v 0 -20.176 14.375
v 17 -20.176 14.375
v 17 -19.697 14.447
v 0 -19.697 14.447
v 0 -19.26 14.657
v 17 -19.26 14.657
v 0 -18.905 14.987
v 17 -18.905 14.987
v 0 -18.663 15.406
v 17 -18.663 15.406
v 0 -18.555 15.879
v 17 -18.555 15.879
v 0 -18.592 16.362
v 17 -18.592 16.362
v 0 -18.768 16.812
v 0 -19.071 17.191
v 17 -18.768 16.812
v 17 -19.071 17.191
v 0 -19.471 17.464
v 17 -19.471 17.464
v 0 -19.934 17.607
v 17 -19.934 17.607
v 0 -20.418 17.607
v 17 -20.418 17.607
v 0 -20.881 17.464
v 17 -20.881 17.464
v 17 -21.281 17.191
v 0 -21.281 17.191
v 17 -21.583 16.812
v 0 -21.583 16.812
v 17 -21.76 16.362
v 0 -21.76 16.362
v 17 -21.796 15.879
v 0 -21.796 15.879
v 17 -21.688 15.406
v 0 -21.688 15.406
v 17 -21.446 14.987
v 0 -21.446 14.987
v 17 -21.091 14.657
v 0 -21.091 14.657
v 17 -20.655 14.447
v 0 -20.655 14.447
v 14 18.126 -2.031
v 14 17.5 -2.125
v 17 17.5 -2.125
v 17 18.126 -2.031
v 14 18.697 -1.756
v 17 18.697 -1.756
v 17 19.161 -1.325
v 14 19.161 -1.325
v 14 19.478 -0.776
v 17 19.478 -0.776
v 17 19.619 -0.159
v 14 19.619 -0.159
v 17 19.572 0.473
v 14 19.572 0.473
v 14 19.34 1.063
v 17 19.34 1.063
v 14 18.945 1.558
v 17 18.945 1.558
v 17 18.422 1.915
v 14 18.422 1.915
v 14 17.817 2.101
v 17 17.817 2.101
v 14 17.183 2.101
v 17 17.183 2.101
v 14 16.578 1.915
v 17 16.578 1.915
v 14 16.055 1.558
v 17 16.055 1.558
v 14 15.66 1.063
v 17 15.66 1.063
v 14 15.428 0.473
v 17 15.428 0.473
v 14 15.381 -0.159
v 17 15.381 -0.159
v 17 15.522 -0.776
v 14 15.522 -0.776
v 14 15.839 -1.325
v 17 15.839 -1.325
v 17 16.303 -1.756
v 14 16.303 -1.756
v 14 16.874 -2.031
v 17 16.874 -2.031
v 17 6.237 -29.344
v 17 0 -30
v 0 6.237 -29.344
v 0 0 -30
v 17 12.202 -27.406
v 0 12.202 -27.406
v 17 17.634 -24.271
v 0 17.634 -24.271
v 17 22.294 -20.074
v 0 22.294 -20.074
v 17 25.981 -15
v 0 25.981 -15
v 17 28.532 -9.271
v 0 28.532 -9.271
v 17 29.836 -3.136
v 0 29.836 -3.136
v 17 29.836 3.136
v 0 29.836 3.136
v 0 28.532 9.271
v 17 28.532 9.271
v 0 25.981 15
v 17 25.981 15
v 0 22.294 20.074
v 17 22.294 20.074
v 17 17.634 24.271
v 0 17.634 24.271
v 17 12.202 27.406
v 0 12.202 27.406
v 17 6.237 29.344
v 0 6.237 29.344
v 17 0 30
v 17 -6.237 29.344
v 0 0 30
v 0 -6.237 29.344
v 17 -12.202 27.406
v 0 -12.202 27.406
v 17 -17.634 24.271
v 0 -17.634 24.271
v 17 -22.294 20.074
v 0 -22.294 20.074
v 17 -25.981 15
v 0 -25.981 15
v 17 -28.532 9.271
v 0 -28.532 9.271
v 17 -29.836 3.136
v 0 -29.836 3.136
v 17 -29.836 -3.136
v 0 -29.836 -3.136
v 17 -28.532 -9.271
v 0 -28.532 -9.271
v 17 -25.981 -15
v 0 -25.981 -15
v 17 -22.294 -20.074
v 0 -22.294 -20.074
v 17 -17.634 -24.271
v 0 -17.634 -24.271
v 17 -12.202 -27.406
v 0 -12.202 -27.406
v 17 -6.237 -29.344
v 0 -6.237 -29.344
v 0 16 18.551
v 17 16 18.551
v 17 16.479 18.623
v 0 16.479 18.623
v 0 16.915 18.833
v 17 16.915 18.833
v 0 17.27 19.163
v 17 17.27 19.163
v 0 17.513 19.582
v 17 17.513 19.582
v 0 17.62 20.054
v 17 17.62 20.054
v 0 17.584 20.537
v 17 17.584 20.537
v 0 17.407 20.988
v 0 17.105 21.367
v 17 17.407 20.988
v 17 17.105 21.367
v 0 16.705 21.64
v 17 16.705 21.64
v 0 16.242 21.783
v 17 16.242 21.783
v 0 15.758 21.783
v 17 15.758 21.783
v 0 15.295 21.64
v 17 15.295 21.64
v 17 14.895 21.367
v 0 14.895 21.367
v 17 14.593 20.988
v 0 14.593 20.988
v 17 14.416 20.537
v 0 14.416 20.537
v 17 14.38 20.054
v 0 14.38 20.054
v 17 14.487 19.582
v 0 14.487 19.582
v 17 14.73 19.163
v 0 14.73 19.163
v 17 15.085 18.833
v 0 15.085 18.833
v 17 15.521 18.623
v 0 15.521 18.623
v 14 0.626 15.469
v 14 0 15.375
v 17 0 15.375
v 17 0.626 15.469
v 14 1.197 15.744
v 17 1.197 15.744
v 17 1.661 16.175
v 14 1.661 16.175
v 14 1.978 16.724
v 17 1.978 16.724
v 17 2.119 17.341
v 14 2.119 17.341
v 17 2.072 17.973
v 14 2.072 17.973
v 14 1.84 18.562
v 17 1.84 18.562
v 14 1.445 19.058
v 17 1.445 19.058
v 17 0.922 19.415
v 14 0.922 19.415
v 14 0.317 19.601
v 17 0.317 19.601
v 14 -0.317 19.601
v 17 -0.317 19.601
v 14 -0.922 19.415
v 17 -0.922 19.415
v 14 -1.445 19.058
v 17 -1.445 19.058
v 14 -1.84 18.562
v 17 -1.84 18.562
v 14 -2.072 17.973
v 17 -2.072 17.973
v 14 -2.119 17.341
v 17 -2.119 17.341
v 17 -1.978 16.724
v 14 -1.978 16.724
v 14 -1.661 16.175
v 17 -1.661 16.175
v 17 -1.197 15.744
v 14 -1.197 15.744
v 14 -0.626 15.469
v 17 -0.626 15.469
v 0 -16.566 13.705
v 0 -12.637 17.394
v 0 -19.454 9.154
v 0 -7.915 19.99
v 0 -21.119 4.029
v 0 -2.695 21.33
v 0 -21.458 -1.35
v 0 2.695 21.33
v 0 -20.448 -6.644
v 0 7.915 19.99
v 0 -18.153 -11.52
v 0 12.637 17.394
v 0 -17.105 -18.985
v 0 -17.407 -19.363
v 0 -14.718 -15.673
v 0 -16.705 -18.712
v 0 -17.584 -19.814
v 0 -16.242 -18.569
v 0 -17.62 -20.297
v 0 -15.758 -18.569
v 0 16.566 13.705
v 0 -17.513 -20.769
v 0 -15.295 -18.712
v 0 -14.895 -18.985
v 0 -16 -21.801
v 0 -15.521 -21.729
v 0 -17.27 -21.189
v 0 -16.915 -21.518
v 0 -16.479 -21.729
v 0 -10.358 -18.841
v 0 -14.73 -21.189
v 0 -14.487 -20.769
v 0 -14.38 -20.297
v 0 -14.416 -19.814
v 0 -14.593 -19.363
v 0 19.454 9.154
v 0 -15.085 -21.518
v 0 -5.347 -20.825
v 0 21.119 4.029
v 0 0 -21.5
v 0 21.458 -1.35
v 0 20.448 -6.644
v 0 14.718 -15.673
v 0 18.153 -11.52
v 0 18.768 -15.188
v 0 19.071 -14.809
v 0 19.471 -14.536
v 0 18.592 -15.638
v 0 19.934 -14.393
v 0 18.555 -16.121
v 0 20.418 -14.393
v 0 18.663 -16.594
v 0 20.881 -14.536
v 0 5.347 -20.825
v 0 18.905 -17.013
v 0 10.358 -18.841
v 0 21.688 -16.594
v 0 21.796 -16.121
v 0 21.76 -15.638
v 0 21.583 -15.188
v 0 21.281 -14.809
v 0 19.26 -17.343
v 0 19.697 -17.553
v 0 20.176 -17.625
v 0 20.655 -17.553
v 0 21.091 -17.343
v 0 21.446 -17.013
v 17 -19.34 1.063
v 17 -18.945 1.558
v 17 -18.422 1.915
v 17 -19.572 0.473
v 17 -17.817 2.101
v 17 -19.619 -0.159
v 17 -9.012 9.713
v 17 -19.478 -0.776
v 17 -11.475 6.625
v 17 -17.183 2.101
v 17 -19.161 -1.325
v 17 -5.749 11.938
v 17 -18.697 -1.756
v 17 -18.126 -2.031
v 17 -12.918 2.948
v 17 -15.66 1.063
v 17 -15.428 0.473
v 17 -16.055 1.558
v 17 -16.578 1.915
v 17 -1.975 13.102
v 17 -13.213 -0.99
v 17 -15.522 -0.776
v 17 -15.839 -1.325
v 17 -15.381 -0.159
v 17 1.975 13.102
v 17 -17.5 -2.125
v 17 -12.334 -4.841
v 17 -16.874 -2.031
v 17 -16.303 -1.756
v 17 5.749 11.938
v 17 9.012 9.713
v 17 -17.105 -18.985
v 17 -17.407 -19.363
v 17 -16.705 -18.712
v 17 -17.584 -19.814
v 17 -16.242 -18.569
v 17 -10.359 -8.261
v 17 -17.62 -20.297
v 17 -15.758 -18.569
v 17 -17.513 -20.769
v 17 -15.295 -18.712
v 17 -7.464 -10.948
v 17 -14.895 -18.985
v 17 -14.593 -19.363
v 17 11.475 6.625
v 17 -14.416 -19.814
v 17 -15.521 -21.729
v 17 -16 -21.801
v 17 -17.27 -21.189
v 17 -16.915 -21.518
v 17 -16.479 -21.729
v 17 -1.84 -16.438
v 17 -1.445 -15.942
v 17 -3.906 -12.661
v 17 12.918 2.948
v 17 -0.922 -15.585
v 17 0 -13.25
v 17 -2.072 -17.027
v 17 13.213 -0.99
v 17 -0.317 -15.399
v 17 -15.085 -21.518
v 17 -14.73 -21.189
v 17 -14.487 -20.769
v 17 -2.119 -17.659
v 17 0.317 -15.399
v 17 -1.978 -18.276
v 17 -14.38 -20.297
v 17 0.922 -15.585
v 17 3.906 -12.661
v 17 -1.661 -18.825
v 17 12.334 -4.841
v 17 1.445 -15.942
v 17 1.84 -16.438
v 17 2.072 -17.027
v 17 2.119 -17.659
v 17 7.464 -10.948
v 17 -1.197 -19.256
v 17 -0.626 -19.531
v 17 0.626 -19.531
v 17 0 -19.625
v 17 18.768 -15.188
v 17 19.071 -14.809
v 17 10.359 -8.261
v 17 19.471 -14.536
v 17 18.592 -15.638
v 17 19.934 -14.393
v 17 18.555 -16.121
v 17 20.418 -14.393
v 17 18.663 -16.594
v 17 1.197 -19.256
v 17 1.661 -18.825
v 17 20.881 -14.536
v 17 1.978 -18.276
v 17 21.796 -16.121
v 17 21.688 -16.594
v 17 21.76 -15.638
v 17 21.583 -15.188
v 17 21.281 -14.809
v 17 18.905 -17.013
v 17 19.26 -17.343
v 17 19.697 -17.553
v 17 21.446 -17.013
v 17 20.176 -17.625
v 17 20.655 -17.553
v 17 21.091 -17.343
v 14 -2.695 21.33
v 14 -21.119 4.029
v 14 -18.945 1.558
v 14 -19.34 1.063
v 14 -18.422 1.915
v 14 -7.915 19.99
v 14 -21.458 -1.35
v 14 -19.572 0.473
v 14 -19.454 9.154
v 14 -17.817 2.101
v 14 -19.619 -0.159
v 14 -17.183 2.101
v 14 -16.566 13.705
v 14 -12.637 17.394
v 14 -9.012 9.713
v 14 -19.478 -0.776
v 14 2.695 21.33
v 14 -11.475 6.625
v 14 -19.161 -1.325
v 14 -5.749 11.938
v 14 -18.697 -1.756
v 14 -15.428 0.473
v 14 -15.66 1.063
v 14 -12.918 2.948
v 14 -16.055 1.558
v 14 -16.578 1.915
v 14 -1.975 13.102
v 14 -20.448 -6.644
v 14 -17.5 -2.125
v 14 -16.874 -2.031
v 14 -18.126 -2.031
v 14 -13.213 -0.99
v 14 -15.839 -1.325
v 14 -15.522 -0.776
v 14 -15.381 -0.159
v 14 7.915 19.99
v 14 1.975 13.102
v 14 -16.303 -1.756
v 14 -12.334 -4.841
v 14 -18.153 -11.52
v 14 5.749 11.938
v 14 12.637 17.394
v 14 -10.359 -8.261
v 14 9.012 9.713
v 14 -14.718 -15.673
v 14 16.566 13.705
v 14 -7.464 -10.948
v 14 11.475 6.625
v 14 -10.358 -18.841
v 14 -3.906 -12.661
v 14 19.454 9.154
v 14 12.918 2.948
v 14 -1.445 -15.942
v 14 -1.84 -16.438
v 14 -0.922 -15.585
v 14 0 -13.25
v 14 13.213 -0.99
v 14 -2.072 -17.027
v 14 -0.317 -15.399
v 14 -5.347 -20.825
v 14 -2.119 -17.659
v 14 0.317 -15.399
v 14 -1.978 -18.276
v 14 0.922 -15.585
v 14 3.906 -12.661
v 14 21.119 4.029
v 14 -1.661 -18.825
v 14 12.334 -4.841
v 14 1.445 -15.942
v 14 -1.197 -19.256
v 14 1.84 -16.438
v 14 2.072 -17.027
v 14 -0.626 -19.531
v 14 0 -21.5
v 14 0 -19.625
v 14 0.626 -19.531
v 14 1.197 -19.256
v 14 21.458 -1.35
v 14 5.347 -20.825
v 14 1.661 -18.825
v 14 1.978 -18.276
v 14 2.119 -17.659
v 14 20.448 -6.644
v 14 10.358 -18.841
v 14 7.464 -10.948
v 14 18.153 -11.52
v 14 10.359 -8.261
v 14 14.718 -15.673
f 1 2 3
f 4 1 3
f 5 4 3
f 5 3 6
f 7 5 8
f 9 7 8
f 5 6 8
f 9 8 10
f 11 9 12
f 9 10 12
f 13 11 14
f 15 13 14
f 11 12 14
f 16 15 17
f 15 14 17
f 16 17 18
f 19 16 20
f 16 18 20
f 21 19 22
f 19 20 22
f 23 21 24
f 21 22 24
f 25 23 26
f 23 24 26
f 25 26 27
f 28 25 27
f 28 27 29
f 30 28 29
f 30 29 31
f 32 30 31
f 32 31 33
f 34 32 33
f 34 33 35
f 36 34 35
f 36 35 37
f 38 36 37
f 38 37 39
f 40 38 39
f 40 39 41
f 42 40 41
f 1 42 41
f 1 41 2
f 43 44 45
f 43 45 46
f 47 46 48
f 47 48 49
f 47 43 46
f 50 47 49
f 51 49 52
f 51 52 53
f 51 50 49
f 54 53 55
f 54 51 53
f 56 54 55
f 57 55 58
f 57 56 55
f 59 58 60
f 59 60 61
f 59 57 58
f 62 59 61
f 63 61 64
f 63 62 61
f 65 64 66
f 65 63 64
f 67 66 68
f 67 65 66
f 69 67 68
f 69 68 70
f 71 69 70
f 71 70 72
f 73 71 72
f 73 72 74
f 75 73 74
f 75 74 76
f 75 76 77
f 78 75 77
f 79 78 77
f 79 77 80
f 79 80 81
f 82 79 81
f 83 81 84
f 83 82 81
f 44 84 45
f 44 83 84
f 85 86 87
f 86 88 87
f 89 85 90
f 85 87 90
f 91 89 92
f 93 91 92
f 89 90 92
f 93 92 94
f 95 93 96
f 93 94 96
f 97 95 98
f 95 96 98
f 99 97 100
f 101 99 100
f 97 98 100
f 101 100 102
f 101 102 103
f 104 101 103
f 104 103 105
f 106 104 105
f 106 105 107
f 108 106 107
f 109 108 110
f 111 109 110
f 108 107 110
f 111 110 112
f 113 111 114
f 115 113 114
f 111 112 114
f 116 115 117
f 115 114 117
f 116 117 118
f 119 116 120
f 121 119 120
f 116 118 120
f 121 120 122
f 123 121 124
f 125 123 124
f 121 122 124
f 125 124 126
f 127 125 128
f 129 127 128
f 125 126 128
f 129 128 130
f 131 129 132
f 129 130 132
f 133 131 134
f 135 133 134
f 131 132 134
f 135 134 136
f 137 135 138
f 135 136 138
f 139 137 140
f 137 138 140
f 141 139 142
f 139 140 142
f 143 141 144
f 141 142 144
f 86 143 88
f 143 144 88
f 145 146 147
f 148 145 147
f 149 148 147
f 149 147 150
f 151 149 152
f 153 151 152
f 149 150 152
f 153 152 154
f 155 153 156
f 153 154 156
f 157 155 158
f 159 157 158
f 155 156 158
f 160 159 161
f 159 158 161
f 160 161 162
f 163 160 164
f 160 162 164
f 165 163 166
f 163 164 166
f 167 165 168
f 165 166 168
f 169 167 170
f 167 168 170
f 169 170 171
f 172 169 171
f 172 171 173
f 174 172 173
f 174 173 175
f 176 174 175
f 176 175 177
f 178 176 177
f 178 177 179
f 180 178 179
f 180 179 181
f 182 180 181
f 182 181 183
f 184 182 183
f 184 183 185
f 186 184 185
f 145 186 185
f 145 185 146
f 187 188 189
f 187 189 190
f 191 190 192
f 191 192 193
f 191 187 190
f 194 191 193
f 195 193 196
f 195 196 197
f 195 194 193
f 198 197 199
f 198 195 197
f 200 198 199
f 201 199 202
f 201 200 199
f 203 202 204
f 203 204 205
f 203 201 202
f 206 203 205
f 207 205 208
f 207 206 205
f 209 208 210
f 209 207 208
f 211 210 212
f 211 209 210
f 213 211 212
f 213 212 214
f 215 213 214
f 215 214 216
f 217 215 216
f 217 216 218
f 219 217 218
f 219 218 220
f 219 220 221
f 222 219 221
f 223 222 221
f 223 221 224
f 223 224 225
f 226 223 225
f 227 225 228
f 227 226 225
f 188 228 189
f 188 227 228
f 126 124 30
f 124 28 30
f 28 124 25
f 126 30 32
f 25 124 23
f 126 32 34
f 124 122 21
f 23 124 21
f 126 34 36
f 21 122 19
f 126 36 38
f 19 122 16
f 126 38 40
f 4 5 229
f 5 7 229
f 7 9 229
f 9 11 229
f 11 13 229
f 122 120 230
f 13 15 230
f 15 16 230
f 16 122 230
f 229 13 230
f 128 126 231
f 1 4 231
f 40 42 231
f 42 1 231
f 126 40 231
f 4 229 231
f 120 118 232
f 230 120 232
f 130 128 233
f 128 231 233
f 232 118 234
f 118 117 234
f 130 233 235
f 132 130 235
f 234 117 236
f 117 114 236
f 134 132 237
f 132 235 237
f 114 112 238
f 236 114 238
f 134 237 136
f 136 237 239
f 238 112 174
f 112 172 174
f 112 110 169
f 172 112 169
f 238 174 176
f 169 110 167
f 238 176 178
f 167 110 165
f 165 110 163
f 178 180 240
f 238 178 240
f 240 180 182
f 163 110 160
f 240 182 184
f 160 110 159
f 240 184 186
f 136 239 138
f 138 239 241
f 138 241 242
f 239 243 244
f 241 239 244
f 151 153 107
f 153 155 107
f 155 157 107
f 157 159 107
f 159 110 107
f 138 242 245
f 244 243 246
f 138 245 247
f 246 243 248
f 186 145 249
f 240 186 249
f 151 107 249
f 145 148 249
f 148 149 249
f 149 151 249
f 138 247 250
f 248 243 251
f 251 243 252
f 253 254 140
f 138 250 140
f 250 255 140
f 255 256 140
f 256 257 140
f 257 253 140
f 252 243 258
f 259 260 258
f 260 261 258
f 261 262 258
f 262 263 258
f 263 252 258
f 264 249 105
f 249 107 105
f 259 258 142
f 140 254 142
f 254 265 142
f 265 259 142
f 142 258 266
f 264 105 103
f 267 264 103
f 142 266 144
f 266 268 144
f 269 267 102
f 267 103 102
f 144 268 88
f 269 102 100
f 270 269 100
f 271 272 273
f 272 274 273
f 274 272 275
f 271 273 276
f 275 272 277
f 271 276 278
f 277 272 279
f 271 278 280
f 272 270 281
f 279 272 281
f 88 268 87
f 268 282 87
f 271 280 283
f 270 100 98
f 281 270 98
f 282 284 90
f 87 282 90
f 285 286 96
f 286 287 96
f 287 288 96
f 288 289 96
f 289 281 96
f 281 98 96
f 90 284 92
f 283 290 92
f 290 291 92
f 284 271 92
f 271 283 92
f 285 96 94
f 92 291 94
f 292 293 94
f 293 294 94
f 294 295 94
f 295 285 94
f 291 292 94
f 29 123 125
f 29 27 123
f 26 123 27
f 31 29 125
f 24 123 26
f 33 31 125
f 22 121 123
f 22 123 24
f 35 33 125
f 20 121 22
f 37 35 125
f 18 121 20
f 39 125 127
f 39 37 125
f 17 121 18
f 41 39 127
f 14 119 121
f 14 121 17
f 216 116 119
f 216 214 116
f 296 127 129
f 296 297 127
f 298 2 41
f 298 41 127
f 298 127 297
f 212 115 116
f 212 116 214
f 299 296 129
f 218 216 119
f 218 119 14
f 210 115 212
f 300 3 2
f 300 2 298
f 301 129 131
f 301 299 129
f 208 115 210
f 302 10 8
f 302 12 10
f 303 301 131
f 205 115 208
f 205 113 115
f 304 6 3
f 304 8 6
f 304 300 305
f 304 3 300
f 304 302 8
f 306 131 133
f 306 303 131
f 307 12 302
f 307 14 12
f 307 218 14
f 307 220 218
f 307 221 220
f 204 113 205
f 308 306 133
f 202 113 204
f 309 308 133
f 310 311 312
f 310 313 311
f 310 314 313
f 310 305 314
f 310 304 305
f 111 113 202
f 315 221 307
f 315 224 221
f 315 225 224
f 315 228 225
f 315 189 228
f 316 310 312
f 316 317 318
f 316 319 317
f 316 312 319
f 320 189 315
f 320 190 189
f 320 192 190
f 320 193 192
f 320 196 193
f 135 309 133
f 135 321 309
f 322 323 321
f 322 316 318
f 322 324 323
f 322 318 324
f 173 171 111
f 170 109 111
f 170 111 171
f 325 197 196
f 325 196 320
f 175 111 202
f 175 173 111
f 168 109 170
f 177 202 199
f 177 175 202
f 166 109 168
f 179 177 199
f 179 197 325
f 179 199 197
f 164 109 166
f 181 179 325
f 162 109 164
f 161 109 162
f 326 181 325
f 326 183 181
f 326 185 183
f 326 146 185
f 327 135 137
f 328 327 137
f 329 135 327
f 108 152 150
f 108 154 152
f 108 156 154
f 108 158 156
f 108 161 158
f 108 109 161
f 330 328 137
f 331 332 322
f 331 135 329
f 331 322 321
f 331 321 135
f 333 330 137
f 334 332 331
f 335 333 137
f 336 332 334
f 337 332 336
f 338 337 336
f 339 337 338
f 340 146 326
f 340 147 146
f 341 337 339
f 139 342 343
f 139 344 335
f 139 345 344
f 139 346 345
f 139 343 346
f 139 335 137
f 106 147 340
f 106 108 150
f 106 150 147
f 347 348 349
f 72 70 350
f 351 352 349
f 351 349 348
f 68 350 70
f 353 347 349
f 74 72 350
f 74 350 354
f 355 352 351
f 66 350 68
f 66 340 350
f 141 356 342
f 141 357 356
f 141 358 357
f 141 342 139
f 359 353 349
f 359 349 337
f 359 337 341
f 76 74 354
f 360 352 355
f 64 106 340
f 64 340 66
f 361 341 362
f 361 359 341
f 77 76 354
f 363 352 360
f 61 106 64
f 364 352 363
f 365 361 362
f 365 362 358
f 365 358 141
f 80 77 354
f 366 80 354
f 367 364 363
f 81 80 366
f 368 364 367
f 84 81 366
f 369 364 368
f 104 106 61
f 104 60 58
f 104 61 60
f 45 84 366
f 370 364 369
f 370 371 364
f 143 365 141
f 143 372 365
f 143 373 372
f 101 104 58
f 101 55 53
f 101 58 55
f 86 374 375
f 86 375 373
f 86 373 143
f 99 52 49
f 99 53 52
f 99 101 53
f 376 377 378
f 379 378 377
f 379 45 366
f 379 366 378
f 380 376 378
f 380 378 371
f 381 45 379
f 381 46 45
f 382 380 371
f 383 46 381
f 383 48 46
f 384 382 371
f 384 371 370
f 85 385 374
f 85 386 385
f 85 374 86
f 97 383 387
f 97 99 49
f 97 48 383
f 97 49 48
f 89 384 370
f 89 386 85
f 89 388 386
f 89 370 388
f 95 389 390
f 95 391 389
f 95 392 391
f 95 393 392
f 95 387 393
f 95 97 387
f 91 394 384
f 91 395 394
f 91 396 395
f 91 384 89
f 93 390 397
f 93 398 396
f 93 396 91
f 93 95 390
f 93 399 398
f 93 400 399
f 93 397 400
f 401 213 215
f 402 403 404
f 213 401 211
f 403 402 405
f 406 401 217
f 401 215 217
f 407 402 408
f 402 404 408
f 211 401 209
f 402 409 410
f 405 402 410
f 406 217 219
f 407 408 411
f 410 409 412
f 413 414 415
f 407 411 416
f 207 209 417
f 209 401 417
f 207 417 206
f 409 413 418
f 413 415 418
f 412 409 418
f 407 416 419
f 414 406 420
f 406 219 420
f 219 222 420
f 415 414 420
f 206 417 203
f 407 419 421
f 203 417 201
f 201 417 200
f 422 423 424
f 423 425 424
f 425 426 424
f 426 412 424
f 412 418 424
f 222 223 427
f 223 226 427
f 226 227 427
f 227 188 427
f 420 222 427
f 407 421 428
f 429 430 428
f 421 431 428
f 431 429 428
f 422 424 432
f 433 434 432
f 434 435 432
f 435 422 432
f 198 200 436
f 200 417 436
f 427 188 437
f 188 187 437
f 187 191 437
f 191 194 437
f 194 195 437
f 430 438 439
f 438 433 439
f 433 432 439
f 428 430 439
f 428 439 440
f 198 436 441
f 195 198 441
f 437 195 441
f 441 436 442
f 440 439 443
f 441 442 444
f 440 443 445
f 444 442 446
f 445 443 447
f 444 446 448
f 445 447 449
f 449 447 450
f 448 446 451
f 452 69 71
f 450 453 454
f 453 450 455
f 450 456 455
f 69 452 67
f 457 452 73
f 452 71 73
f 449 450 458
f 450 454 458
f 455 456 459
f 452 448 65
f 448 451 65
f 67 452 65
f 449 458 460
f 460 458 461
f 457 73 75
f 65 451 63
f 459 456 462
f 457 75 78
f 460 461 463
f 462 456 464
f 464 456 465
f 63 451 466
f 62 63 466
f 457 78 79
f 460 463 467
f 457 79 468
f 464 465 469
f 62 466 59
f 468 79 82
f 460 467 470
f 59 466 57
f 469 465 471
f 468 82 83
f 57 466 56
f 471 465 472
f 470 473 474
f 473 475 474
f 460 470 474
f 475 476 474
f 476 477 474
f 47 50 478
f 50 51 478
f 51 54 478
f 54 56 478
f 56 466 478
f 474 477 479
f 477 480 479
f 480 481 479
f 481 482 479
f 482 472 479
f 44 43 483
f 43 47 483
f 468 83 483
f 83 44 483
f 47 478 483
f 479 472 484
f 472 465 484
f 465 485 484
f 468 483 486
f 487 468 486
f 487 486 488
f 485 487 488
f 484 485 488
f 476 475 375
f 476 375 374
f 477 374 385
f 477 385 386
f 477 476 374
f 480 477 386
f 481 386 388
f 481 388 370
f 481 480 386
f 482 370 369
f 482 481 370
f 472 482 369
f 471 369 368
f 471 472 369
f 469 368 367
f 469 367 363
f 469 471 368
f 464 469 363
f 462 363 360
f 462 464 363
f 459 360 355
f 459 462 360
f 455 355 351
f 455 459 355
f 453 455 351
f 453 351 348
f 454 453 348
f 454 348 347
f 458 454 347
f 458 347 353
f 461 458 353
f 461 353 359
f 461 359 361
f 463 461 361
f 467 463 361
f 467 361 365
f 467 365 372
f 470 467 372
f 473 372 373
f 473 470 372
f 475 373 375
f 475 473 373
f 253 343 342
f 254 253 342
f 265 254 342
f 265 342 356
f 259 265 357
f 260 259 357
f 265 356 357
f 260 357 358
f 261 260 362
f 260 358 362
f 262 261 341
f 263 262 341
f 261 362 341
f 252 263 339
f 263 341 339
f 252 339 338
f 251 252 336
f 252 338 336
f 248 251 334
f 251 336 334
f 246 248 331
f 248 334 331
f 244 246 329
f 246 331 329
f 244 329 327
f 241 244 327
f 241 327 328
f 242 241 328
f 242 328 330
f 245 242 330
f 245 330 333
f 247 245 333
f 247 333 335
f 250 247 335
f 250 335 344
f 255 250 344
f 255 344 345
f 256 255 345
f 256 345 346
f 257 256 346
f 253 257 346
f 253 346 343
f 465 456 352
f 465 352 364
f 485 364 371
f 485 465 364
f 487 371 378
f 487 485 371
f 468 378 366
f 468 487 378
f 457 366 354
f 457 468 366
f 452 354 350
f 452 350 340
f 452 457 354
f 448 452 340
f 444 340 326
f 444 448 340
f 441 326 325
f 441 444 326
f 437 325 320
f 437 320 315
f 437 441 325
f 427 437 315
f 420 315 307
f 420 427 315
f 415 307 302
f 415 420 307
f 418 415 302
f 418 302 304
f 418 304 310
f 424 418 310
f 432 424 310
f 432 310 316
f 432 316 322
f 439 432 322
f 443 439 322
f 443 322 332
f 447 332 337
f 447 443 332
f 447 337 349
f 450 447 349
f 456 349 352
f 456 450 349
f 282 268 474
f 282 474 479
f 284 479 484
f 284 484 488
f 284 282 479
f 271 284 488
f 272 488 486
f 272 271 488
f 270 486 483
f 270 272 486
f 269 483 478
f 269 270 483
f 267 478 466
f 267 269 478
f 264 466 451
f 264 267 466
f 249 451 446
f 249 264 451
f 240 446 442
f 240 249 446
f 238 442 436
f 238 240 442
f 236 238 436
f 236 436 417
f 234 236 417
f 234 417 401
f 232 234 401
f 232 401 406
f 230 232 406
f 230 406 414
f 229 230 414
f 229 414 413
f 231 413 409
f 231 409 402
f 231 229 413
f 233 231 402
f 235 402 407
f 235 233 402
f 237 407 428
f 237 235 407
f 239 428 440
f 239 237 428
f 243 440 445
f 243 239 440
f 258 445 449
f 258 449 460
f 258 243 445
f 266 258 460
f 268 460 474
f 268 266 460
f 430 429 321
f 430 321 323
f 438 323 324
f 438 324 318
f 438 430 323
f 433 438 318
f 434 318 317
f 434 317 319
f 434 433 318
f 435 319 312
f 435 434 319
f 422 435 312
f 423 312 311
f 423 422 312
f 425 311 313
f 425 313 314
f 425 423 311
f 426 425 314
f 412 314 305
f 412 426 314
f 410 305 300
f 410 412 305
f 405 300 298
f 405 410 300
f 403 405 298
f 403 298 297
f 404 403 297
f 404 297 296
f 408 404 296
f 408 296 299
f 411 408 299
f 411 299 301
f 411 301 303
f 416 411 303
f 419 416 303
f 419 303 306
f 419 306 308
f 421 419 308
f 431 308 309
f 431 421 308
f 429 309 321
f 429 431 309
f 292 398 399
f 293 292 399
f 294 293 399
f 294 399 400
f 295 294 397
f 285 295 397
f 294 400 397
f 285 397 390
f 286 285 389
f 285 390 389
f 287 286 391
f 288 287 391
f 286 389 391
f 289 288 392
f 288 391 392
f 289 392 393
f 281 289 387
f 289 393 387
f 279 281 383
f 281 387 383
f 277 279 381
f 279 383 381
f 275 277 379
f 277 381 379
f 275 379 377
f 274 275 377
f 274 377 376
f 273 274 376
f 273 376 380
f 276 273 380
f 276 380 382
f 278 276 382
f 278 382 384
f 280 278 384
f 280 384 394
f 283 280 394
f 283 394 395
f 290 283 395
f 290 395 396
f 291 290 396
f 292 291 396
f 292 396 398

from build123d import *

# Parameters (mm, degrees)
SKETCH1_R           = 30
SKETCH1_R_2         = 21.5
BOSS_EXTRUDE1_DEPTH = 14
SKETCH2_R           = 30
SKETCH2_R_2         = 2.125
SKETCH2_R_3         = 13.25
BOSS_EXTRUDE2_DEPTH = 3
SKETCH4_R           = 1.625
CUT_EXTRUDE1_DEPTH  = 46.705579528


with BuildPart() as part:
    # Sketch1 → Boss-Extrude1 (new body)
    with BuildSketch(Plane(origin=(0, 0, 0), x_dir=(0, 0, -1), z_dir=(1, 0, 0))):
        Circle(SKETCH1_R)
        Circle(SKETCH1_R_2, mode=Mode.SUBTRACT)
    extrude(amount=BOSS_EXTRUDE1_DEPTH)

    # Sketch2 → Boss-Extrude2 (add)
    with BuildSketch(Plane(origin=(14, 0, 0), x_dir=(0, 0, -1), z_dir=(1, 0, 0))):
        Circle(SKETCH2_R)
        with Locations((0, 17.5)):
            Circle(SKETCH2_R_2, mode=Mode.SUBTRACT)
        with Locations((17.5, 0)):
            Circle(SKETCH2_R_2, mode=Mode.SUBTRACT)
        with Locations((0, -17.5)):
            Circle(SKETCH2_R_2, mode=Mode.SUBTRACT)
        with Locations((-17.5, 0)):
            Circle(SKETCH2_R_2, mode=Mode.SUBTRACT)
        Circle(SKETCH2_R_3, mode=Mode.SUBTRACT)
    extrude(amount=BOSS_EXTRUDE2_DEPTH)

    # Sketch4 → Cut-Extrude1 (cut, through all)
    with BuildSketch(Plane(origin=(17, 0, 0), x_dir=(0, 0, -1), z_dir=(1, 0, 0))):
        with Locations((-20.175789947, 16)):
            Circle(SKETCH4_R)
        with Locations((16, 20.175789947)):
            Circle(SKETCH4_R)
        with Locations((20.175789947, -16)):
            Circle(SKETCH4_R)
        with Locations((-16, -20.175789947)):
            Circle(SKETCH4_R)
    extrude(amount=-CUT_EXTRUDE1_DEPTH, mode=Mode.SUBTRACT)


solid = part.part
